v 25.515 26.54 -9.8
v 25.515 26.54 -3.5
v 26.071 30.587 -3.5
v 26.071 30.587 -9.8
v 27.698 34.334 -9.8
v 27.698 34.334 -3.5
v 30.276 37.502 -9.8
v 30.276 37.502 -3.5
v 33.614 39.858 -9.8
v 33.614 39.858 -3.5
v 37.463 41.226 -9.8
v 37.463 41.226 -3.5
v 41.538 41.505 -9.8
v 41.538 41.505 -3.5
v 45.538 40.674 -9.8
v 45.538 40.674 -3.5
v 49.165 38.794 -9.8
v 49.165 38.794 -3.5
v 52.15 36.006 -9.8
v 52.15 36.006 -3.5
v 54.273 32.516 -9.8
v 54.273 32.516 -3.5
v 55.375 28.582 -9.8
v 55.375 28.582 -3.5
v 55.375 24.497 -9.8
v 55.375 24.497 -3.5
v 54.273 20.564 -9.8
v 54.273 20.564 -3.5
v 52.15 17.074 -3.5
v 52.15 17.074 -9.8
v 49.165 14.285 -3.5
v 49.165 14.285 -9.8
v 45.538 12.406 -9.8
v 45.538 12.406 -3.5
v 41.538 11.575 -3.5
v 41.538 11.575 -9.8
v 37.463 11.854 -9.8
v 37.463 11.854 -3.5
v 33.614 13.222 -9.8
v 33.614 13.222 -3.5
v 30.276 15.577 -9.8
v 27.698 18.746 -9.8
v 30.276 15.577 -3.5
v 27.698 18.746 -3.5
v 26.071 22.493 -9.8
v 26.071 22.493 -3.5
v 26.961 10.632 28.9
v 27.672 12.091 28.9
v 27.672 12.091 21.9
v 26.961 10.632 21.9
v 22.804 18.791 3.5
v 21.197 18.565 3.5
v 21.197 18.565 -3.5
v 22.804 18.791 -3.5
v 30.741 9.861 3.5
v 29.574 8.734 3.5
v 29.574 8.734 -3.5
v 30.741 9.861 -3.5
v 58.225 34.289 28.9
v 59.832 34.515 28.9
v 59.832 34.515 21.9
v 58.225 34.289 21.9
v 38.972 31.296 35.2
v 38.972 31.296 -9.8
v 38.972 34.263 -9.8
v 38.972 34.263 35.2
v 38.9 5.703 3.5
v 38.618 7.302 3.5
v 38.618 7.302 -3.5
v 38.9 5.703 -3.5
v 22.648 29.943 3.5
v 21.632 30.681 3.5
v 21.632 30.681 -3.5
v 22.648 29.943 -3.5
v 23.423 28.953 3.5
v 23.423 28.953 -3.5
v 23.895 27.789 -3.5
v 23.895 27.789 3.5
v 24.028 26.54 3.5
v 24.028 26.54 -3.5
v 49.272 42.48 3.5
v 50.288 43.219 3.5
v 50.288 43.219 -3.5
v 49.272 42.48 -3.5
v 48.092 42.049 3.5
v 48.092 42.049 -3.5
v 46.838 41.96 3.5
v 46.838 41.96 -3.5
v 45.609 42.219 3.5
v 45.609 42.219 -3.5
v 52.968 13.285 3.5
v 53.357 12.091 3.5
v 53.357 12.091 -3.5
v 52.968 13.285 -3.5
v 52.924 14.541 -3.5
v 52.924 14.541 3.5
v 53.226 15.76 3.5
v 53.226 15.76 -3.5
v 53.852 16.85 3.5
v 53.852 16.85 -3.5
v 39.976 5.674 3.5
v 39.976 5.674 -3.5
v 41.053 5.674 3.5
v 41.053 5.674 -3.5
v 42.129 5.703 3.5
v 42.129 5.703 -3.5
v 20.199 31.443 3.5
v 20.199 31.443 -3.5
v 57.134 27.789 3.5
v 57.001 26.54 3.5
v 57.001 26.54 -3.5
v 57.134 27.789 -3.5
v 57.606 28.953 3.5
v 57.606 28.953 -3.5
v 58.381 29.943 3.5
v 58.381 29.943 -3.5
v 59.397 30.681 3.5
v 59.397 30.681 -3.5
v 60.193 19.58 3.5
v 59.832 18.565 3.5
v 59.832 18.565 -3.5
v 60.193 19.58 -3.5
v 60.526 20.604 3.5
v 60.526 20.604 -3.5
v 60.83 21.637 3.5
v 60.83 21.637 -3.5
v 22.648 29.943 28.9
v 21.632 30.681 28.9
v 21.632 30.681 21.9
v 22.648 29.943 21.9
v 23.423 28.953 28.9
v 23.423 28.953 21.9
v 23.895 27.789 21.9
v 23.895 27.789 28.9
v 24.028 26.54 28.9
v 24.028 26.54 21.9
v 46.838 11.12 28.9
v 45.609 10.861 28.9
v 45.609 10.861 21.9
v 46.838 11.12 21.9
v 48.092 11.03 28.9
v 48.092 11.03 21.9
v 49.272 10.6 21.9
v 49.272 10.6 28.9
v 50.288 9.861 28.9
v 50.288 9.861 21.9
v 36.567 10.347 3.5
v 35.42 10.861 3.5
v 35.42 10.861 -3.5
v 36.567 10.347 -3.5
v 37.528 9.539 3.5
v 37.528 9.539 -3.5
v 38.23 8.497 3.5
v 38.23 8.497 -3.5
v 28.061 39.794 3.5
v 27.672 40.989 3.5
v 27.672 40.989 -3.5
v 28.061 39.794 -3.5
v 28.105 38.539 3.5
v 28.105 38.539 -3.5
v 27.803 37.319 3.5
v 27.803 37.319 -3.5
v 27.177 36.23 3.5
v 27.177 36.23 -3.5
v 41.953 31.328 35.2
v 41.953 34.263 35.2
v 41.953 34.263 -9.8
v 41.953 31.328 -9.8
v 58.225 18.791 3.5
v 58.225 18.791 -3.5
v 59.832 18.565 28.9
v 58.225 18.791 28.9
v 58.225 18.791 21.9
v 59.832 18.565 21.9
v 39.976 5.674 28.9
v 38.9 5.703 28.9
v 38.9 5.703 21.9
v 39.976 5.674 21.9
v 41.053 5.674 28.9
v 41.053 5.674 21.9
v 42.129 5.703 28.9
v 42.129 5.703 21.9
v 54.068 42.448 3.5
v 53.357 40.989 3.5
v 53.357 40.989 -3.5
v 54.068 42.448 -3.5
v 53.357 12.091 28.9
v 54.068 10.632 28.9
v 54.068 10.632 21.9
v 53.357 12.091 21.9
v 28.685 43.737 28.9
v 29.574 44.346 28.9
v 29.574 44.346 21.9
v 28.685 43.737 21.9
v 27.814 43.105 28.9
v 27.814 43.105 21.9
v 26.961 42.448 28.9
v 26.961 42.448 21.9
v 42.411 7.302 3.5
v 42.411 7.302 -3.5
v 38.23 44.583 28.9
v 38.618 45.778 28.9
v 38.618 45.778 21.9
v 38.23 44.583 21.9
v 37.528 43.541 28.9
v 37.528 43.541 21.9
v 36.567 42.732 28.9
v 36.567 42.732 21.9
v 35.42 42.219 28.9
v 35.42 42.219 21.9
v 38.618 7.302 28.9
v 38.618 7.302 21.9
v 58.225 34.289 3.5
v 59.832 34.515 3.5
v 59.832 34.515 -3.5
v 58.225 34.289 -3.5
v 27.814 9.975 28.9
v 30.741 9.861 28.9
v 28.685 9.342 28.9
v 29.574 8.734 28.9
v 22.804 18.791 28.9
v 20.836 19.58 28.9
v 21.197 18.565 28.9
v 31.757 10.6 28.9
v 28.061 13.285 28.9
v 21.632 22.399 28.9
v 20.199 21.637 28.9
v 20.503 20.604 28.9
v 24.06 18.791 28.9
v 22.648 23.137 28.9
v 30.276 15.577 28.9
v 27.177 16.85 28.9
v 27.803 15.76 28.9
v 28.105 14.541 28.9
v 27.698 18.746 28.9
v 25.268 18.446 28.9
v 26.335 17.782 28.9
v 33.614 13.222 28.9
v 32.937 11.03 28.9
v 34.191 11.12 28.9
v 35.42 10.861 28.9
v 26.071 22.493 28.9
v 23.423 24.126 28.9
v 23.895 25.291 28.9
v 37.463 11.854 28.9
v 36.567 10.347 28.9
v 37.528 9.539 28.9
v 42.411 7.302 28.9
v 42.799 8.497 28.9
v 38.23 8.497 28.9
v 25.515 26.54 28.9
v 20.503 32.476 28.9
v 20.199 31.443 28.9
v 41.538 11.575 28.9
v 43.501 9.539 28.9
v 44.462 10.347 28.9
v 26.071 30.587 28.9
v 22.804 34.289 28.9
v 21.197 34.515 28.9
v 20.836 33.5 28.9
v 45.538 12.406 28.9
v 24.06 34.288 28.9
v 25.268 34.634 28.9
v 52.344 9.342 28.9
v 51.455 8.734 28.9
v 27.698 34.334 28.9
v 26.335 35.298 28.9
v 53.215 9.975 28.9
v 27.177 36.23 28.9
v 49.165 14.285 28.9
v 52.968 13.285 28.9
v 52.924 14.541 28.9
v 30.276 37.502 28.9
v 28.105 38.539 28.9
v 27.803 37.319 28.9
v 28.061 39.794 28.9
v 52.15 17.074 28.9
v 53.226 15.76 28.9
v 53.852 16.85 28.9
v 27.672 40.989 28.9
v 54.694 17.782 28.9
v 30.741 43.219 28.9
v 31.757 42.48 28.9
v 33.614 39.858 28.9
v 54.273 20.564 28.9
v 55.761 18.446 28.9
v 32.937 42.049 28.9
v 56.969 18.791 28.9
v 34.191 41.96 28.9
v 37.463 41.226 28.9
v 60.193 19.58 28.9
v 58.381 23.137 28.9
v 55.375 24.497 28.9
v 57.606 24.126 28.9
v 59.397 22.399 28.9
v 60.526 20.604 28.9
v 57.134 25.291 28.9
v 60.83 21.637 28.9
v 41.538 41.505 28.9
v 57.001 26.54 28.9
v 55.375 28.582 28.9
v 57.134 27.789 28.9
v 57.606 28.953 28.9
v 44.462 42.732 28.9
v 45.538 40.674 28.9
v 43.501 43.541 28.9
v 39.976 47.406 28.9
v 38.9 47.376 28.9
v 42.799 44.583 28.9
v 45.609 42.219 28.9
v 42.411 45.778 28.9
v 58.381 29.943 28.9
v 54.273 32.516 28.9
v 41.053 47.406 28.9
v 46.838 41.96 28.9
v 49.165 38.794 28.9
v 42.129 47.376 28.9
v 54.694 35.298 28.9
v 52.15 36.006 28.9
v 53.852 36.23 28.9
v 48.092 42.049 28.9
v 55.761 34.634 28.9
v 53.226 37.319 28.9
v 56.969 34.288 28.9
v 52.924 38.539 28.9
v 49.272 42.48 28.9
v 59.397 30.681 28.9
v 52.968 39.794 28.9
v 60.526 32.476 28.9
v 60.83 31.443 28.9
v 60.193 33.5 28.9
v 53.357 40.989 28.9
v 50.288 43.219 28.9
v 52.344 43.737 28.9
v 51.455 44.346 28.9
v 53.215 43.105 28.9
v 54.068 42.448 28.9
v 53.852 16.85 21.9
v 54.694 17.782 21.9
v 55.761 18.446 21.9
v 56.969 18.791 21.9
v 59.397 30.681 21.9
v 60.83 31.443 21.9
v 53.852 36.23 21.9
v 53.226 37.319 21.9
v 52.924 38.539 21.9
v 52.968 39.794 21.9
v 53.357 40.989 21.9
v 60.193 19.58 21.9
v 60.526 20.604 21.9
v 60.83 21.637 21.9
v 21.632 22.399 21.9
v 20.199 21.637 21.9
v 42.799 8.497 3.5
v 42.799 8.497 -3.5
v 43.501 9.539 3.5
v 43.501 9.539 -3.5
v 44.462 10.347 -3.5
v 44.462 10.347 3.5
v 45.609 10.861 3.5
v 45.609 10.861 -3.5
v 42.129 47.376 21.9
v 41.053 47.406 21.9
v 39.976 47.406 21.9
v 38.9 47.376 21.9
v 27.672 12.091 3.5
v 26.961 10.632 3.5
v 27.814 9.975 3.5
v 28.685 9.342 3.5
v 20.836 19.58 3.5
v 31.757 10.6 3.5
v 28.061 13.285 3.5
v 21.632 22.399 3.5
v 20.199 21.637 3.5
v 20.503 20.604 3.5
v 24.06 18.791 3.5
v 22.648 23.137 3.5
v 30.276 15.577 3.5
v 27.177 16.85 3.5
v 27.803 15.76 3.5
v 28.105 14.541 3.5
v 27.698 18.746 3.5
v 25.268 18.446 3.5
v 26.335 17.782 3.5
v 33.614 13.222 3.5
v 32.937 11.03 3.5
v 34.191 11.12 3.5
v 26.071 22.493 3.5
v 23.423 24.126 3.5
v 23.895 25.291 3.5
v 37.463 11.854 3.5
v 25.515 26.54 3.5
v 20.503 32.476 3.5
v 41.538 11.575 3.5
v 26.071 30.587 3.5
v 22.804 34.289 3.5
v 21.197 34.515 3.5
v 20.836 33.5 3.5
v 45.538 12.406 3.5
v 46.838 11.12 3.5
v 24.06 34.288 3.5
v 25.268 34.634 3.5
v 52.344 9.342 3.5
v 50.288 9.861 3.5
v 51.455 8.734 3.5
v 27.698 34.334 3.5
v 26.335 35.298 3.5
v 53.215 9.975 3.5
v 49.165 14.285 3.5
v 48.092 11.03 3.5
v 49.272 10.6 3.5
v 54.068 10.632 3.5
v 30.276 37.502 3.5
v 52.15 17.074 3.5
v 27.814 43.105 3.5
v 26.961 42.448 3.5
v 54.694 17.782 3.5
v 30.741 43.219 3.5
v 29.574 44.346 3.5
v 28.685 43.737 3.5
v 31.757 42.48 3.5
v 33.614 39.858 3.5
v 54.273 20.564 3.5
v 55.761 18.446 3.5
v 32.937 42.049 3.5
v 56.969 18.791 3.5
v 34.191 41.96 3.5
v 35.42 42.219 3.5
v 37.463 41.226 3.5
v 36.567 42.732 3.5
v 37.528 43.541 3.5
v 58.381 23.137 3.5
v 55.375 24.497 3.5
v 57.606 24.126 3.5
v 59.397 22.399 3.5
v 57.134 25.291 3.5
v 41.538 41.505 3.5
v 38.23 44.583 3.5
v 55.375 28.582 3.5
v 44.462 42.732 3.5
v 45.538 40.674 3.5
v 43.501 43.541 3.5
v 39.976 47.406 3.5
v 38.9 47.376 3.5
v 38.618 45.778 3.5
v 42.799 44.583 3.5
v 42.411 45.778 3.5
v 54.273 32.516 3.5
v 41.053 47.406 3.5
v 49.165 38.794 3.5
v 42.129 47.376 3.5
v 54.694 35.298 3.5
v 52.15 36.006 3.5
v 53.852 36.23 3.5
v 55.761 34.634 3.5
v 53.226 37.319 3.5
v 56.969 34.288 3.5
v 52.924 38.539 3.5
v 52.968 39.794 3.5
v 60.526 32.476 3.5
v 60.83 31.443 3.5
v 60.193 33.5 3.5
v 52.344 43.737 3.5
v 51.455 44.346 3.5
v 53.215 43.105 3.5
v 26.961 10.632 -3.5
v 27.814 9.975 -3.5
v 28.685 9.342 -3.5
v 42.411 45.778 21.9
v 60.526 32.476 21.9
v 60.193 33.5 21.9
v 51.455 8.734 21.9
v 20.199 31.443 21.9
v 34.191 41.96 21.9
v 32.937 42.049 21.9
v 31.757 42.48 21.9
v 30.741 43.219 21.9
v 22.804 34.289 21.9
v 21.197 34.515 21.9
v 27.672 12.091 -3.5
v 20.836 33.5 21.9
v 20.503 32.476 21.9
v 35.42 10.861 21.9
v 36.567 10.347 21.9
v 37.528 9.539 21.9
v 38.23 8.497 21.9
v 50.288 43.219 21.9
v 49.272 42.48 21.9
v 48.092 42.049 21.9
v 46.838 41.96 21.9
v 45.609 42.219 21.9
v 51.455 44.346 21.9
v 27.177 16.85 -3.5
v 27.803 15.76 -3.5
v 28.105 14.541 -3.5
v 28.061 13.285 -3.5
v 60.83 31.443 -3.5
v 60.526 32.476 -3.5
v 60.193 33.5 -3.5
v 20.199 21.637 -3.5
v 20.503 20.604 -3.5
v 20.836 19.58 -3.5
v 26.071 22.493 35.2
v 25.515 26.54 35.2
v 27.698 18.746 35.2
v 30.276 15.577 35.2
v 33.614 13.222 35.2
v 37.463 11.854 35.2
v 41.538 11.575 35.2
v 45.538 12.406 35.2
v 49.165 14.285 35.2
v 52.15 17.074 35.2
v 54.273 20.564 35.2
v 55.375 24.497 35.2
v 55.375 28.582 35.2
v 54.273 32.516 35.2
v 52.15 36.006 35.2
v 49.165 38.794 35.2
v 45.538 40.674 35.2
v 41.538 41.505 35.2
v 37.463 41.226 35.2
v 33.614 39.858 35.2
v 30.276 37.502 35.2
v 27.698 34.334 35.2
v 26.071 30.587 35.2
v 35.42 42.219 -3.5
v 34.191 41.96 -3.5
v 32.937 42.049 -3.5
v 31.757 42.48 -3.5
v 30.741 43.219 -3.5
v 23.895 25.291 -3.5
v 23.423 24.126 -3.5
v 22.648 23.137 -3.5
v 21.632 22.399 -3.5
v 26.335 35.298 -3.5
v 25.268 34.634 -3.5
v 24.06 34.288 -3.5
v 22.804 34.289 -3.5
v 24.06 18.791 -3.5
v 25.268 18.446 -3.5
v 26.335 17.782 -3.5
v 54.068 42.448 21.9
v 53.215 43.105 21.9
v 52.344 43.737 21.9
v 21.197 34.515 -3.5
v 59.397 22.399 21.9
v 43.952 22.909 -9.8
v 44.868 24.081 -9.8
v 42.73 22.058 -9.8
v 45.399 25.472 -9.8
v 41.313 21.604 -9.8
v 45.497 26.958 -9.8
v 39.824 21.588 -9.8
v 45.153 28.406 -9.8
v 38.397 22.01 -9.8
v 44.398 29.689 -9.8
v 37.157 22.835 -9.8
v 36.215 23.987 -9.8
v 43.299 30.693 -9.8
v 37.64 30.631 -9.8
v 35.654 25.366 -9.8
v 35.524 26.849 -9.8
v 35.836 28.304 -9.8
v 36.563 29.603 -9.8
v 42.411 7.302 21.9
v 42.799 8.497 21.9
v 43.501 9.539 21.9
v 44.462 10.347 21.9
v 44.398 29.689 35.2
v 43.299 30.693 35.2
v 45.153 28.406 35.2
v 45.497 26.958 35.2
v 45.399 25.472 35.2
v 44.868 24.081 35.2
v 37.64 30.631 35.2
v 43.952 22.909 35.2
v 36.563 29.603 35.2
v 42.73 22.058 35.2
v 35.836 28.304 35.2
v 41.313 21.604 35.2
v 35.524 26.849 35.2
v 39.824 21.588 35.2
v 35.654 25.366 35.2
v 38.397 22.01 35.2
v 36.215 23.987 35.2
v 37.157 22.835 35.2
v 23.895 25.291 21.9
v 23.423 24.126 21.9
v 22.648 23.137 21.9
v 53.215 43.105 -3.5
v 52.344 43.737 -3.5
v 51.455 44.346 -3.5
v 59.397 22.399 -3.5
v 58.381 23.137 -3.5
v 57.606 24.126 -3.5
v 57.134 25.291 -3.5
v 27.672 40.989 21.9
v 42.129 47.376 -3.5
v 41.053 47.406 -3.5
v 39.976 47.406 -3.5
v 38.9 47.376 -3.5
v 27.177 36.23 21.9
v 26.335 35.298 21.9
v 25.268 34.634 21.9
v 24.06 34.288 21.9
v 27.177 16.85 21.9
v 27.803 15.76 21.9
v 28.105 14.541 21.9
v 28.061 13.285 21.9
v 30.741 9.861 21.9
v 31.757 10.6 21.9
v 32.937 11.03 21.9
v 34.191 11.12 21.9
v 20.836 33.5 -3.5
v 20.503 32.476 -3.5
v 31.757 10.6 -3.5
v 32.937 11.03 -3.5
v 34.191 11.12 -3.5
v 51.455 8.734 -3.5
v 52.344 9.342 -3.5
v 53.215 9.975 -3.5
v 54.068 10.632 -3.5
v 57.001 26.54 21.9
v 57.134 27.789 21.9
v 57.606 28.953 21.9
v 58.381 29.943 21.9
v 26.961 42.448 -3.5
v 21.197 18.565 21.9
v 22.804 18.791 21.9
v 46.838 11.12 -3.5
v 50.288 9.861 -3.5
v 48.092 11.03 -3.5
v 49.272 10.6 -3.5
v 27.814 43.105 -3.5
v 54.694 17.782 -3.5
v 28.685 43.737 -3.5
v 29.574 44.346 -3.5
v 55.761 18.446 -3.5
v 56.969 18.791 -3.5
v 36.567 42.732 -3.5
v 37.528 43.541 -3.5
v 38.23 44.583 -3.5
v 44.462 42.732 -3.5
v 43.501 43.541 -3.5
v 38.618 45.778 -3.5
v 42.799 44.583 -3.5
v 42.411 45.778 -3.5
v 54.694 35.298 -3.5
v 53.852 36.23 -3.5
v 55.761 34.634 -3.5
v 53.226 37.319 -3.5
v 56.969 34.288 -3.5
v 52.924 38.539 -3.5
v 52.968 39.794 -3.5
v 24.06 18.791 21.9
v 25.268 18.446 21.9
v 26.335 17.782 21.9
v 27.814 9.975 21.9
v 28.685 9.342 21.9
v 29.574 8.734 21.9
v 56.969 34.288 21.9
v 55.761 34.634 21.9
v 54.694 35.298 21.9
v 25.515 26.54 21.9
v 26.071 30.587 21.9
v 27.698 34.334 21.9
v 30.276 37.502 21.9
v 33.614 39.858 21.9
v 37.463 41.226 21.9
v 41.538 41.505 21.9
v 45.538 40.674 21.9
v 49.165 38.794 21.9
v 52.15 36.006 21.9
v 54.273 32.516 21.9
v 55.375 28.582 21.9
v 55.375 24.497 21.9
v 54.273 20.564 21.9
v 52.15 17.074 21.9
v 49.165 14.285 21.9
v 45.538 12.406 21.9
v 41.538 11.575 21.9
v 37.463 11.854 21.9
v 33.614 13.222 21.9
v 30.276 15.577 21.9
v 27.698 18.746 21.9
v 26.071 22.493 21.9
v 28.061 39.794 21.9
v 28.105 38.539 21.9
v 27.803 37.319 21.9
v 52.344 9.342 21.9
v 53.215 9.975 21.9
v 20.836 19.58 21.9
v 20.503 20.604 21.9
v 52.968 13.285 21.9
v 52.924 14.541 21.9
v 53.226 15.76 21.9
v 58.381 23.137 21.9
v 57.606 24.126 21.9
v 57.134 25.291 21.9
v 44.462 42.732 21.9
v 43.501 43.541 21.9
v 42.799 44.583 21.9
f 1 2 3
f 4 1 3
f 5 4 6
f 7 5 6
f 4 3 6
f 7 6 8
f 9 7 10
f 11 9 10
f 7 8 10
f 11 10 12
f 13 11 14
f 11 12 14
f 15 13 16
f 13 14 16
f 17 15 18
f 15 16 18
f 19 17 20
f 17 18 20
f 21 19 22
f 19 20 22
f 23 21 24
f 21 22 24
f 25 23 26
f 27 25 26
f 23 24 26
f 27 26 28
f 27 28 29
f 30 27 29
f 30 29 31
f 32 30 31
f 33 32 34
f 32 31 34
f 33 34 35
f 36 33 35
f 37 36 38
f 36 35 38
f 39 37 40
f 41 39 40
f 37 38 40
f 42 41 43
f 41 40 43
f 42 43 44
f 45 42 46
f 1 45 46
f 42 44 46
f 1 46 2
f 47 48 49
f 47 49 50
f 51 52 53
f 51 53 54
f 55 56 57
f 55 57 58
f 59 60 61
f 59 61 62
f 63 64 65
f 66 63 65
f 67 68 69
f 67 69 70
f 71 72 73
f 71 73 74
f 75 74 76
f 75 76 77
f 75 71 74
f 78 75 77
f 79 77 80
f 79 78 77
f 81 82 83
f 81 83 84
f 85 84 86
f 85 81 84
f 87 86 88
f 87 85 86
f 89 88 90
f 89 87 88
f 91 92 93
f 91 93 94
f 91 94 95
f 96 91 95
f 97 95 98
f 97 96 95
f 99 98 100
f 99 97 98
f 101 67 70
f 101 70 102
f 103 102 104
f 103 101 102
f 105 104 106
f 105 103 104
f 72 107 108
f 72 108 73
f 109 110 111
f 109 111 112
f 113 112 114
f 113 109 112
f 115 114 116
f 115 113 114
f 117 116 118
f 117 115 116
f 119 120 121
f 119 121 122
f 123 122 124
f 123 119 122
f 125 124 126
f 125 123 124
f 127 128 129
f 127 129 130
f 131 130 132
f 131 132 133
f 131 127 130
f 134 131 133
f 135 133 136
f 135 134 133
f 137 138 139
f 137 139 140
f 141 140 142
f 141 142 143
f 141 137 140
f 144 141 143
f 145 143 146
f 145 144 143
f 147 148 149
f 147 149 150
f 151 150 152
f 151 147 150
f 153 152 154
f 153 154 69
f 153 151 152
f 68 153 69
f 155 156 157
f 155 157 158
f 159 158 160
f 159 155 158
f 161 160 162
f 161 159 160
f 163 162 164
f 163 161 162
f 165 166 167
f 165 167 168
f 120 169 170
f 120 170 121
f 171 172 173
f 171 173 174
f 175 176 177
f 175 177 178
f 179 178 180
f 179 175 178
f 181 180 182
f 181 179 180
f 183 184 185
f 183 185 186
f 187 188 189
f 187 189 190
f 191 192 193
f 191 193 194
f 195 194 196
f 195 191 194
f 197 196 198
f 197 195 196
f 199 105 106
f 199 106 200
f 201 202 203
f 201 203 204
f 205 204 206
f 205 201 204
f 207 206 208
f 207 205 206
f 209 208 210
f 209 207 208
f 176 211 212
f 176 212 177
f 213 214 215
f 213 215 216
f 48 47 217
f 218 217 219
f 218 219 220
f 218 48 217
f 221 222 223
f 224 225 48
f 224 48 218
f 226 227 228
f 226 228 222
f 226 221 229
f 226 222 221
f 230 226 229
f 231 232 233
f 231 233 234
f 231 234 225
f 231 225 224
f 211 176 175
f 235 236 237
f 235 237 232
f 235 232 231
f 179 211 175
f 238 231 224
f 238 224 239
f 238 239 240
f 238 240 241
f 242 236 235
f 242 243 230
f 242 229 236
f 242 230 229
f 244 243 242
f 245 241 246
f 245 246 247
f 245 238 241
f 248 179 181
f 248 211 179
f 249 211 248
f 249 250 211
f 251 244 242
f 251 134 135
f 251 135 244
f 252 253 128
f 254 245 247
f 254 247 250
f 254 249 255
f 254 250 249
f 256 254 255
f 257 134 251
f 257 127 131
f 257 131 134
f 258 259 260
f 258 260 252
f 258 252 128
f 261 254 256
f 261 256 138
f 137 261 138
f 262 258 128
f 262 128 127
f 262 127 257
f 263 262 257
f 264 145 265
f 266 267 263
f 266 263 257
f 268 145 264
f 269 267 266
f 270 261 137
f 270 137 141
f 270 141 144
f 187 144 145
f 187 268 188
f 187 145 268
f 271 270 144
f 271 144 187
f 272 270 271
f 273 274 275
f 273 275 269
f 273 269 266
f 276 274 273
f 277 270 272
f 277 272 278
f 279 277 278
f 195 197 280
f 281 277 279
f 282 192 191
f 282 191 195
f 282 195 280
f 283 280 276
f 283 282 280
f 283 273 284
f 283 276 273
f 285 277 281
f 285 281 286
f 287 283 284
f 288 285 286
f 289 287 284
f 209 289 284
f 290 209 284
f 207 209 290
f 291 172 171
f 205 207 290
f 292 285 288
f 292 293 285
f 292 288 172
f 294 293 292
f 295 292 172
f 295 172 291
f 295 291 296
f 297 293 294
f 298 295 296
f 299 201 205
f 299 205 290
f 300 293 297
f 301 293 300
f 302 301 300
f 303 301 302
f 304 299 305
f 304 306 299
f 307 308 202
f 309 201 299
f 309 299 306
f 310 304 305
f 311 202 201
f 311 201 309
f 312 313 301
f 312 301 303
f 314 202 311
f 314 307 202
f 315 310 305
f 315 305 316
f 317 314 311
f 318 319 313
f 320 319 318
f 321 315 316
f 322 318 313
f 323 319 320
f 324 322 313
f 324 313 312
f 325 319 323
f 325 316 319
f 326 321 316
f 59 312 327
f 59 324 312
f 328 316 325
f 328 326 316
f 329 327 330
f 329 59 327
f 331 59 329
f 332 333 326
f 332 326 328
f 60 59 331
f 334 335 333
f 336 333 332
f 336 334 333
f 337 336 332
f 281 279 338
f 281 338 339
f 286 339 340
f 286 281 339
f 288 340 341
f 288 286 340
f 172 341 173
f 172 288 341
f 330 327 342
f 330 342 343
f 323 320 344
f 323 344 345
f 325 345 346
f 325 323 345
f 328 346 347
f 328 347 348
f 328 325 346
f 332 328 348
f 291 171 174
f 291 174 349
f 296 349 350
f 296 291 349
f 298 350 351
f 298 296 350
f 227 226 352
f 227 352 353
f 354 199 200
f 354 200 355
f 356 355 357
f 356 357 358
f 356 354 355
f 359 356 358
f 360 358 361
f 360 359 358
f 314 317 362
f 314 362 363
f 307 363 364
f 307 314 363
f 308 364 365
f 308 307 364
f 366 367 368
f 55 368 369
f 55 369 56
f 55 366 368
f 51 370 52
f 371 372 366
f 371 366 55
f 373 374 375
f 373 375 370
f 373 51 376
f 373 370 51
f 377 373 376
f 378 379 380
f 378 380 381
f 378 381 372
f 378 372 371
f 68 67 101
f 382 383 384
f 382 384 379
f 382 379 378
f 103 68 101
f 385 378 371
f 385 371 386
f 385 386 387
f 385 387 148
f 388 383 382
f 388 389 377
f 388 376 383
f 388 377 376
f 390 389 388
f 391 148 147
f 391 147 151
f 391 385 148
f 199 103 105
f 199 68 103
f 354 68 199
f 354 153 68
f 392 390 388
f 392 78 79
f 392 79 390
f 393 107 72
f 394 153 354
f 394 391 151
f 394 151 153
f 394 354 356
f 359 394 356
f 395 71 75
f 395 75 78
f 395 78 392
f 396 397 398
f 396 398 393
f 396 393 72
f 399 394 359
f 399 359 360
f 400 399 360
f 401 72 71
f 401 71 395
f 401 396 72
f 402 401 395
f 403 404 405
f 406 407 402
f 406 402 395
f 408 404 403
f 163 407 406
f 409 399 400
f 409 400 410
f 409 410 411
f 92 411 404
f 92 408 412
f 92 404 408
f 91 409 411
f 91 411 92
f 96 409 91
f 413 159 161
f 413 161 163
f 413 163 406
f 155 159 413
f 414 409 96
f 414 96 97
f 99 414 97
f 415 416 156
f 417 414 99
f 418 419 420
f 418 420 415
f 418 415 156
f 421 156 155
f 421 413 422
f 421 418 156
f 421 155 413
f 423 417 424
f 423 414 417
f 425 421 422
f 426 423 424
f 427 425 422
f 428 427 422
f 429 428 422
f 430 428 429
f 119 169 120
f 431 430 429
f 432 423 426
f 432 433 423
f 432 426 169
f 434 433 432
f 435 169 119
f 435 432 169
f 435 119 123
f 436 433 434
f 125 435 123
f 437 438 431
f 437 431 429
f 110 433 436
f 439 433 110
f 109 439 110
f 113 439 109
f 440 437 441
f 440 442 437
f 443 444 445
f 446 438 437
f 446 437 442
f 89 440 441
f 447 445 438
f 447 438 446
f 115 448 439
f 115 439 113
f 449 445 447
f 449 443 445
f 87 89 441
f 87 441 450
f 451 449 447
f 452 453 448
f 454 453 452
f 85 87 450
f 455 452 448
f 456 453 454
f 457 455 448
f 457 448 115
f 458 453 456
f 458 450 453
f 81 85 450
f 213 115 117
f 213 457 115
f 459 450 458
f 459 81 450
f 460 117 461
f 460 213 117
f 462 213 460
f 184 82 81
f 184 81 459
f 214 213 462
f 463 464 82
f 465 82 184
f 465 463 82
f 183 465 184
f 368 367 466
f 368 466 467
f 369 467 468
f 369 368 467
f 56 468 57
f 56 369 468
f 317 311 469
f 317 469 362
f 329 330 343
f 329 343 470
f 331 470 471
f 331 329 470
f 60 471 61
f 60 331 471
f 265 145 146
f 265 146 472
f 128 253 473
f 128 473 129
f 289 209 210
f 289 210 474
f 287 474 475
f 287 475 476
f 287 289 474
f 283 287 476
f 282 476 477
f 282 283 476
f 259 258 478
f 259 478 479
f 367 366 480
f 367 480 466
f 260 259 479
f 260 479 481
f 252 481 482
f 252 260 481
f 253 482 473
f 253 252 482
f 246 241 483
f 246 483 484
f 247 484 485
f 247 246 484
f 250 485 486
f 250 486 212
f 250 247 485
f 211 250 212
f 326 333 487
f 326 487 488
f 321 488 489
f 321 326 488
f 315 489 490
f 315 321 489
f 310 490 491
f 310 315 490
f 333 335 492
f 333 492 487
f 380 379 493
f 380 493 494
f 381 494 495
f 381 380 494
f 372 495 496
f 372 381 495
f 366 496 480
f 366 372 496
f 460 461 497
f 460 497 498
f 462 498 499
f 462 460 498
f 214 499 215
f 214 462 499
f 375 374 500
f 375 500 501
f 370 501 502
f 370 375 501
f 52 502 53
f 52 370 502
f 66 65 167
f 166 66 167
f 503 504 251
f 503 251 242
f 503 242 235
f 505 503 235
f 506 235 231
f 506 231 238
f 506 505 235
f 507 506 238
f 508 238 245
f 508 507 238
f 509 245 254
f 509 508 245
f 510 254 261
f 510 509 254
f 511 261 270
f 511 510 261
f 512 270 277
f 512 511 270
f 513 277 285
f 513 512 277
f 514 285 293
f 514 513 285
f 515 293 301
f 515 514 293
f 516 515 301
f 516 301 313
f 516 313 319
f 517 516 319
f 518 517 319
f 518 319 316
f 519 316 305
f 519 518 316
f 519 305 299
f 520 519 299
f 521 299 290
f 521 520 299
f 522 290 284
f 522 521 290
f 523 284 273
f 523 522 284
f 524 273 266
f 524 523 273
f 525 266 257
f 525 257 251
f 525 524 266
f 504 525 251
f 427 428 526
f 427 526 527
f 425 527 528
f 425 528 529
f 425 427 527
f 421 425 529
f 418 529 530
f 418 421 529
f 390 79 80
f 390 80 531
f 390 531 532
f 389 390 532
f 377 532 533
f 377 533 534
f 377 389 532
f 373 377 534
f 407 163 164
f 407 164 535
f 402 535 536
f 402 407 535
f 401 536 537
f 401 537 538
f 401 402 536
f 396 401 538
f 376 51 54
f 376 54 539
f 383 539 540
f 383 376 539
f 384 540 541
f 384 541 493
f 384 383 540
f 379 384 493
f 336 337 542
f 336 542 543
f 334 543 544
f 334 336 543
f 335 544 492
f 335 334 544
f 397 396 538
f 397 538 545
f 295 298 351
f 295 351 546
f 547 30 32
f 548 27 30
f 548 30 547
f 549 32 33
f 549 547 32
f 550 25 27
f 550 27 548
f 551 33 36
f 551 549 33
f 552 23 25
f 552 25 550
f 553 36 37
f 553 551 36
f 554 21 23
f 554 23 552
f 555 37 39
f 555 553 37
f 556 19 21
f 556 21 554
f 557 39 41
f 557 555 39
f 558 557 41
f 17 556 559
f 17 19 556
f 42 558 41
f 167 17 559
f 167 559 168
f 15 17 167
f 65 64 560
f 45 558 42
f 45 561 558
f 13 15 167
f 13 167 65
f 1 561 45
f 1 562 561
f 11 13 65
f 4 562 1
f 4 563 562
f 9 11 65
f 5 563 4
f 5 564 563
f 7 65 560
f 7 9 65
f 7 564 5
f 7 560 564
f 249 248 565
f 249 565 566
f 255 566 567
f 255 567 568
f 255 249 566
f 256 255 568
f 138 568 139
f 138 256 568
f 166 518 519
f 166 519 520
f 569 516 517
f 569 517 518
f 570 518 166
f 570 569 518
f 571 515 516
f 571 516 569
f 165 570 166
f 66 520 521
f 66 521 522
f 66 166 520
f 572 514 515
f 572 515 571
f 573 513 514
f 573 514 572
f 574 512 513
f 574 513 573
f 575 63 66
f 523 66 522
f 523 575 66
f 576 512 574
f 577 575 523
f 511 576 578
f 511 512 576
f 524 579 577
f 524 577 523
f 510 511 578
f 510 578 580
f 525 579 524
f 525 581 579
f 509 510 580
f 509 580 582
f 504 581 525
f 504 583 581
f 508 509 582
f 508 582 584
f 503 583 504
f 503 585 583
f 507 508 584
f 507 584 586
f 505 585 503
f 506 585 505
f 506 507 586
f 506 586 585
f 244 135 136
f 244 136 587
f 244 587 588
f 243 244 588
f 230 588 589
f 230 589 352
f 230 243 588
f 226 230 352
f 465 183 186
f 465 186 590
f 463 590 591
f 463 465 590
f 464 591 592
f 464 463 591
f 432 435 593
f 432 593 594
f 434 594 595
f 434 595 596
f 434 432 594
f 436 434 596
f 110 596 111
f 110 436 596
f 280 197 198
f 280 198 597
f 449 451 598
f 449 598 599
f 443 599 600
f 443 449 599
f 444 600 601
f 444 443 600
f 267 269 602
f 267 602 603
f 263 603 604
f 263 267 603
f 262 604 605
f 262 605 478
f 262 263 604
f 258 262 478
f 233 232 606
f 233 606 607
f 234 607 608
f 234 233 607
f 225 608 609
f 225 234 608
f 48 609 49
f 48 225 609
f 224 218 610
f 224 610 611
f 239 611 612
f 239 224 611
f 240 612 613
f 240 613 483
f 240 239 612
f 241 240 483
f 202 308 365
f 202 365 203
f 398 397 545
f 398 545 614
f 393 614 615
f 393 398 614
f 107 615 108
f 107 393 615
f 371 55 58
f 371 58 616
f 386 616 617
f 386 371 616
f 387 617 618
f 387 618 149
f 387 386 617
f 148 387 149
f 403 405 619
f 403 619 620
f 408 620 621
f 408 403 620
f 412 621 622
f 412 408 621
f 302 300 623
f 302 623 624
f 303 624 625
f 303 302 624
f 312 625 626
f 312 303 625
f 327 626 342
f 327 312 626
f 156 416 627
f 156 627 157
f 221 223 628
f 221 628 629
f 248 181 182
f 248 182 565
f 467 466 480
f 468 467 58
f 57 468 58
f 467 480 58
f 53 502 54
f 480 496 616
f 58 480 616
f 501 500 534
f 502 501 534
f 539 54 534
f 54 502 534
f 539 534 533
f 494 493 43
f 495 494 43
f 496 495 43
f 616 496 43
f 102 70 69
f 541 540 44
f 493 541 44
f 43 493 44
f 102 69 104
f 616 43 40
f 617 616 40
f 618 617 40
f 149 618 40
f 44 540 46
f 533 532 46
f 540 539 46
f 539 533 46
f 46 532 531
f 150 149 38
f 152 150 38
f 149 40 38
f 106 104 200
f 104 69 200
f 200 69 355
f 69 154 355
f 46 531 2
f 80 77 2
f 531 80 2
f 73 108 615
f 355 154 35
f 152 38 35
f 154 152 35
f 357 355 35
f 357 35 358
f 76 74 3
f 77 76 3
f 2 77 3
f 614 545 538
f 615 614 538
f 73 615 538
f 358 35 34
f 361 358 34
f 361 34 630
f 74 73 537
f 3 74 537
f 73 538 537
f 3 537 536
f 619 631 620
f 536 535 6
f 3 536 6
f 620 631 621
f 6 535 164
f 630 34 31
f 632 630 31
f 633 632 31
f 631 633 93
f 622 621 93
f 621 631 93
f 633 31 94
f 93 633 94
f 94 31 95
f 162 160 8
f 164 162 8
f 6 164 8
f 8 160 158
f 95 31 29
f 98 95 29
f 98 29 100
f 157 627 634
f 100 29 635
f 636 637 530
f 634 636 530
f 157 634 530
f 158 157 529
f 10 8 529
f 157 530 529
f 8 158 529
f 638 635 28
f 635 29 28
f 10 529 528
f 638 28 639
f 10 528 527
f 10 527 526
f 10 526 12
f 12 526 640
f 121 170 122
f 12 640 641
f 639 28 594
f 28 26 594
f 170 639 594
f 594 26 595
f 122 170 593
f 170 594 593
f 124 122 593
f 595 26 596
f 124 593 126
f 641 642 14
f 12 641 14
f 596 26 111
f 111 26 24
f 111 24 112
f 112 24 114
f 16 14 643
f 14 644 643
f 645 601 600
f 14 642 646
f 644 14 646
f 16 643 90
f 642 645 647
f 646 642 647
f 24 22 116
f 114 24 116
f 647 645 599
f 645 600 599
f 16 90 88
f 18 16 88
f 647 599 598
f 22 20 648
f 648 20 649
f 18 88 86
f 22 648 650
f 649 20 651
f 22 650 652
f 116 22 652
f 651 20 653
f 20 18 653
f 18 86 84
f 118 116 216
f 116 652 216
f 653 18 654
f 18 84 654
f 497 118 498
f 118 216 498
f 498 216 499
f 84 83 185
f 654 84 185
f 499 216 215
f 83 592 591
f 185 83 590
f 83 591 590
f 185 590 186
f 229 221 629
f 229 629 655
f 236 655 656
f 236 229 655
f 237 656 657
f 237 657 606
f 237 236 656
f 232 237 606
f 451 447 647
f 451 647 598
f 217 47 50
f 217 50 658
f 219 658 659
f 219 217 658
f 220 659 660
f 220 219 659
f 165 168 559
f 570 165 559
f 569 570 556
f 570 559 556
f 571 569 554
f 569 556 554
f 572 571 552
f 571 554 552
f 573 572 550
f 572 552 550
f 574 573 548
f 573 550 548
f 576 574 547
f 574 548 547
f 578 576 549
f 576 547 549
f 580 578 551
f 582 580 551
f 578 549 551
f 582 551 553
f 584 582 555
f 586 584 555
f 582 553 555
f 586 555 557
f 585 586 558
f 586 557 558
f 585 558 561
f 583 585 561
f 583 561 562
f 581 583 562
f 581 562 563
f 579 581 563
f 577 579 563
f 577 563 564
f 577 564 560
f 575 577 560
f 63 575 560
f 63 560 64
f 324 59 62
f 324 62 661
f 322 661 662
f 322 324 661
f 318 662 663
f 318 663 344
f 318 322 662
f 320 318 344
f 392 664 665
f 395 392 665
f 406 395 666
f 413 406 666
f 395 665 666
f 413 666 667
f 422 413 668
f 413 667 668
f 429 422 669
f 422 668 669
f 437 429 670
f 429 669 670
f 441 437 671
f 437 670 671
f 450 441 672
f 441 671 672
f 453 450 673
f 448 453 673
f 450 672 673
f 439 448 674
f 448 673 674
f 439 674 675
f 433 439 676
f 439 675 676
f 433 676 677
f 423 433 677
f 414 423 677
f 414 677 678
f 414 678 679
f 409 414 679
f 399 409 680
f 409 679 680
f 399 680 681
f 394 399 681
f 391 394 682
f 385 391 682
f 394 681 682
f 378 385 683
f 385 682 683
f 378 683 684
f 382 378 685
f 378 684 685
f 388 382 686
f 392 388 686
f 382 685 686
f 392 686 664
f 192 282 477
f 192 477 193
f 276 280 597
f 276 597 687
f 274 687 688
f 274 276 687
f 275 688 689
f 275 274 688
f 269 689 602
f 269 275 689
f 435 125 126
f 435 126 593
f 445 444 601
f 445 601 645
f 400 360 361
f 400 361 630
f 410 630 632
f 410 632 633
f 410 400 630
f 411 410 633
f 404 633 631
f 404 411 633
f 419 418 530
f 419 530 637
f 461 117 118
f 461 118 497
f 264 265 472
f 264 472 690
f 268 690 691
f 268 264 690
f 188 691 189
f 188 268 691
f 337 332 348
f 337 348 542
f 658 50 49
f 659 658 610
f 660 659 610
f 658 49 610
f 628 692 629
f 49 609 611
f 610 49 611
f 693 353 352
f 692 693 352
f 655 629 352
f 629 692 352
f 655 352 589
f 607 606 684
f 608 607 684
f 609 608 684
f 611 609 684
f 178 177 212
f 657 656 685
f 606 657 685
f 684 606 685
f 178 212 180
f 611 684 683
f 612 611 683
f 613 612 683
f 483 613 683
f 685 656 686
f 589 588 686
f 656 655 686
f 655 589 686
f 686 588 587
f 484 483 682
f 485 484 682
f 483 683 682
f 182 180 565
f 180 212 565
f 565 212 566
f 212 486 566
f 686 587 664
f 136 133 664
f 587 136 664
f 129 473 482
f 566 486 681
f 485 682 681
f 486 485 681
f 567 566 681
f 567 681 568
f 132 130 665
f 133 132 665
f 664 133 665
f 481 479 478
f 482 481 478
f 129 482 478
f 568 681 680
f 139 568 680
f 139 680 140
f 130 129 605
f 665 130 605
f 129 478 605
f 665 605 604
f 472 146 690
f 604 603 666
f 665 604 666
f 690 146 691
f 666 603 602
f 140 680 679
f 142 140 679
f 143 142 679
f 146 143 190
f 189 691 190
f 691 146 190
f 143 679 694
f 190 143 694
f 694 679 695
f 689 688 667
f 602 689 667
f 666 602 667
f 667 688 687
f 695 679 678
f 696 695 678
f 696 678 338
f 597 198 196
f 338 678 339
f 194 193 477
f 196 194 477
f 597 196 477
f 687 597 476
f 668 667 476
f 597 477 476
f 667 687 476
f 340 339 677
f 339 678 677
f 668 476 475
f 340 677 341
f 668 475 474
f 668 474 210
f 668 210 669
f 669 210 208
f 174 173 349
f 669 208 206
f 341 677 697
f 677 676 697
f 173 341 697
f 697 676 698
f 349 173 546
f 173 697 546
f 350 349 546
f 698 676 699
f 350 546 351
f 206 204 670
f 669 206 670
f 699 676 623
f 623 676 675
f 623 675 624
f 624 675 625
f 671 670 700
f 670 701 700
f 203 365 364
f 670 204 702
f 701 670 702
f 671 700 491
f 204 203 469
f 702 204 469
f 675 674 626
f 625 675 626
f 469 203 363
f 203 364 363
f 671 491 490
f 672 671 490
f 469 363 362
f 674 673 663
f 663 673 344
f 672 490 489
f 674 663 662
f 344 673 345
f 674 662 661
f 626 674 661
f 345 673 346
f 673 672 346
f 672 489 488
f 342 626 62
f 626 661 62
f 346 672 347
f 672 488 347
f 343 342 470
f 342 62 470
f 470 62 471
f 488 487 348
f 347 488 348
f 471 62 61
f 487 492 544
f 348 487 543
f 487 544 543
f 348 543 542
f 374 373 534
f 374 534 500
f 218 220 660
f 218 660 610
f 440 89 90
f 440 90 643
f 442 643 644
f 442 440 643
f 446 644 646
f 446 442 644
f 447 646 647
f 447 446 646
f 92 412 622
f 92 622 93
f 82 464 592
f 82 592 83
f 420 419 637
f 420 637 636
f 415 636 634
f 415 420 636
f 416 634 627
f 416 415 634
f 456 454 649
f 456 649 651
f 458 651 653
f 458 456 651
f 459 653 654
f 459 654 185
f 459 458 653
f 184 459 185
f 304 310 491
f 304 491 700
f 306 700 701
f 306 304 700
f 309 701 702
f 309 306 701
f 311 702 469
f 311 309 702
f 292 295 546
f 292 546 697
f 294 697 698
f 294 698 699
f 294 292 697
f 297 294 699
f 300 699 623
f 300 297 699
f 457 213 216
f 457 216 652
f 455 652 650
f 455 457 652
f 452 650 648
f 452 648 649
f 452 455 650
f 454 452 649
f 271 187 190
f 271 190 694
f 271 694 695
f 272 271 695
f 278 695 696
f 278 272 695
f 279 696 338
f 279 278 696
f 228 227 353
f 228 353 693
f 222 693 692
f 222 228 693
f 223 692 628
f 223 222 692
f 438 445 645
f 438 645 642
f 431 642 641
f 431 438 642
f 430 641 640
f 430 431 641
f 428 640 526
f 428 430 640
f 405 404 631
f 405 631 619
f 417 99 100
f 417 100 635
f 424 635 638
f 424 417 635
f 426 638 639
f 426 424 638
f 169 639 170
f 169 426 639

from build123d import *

# Parameters (mm, degrees)
EXTRUDE_1_DEPTH     = 7
SKETCH_2_R          = 15
EXTRUDE_2_DEPTH     = 18.4
EXTRUDE_3_DEPTH     = 7
EXTRUDE_START       = 6.3
SKETCH_4_R          = 15
EXTRUDE_4_DEPTH     = 6.3
SKETCH_5_R          = 15
EXTRUDE_5_DEPTH     = 6.3
CUT_EXTRUDE_1_DEPTH = 90.291681756


with BuildPart() as part:
    # 草图1 → 凸台-拉伸1 (new body)
    with BuildSketch(Plane.XY.offset(28.9)):
        with BuildLine():
            Line((42.411201909, 45.77806603), (42.129389286, 47.376304833))
            ThreePointArc((42.129389286, 47.376304833), (40.514502568, 47.409839327), (38.89961585, 47.376304833))
            Line((38.89961585, 47.376304833), (38.617803227, 45.77806603))
            ThreePointArc((38.617803227, 45.77806603), (37.528159676, 43.541003491), (35.420005537, 42.219088972))
            ThreePointArc((35.420005537, 42.219088972), (32.937471152, 42.04939837), (30.741018632, 43.218743572))
            Line((30.741018632, 43.218743572), (29.573606233, 44.346100621))
            ThreePointArc((29.573606233, 44.346100621), (28.247424353, 43.424024), (26.960664635, 42.447687427))
            Line((26.960664635, 42.447687427), (27.672094632, 40.98903977))
            ThreePointArc((27.672094632, 40.98903977), (28.10546685, 38.538741749), (27.176936184, 36.230148526))
            ThreePointArc((27.176936184, 36.230148526), (25.268265311, 34.633668845), (22.80397403, 34.288646587))
            Line((22.80397403, 34.288646587), (21.196873713, 34.514509808))
            ThreePointArc((21.196873713, 34.514509808), (20.665953073, 32.989024), (20.198818833, 31.442812735))
            Line((20.198818833, 31.442812735), (21.631749371, 30.680910052))
            ThreePointArc((21.631749371, 30.680910052), (23.422603901, 28.95330711), (24.028363863, 26.539839327))
            ThreePointArc((24.028363863, 26.539839327), (23.422603901, 24.126371544), (21.631749371, 22.398768602))
            Line((21.631749371, 22.398768602), (20.198818833, 21.63686592))
            ThreePointArc((20.198818833, 21.63686592), (20.665953073, 20.090654655), (21.196873713, 18.565168847))
            Line((21.196873713, 18.565168847), (22.80397403, 18.791032067))
            ThreePointArc((22.80397403, 18.791032067), (25.268265311, 18.446009809), (27.176936184, 16.849530129))
            ThreePointArc((27.176936184, 16.849530129), (28.10546685, 14.540936905), (27.672094632, 12.090638884))
            Line((27.672094632, 12.090638884), (26.960664635, 10.631991228))
            ThreePointArc((26.960664635, 10.631991228), (28.247424353, 9.655654655), (29.573606233, 8.733578033))
            Line((29.573606233, 8.733578033), (30.741018632, 9.860935083))
            ThreePointArc((30.741018632, 9.860935083), (32.937471152, 11.030280285), (35.420005536, 10.860589683))
            ThreePointArc((35.420005536, 10.860589683), (37.528159676, 9.538675164), (38.617803227, 7.301612625))
            Line((38.617803227, 7.301612625), (38.89961585, 5.703373822))
            ThreePointArc((38.89961585, 5.703373822), (40.514502568, 5.669839327), (42.129389286, 5.703373822))
            Line((42.129389286, 5.703373822), (42.411201909, 7.301612625))
            ThreePointArc((42.411201909, 7.301612625), (43.50084546, 9.538675164), (45.6089996, 10.860589683))
            ThreePointArc((45.6089996, 10.860589683), (48.091533984, 11.030280285), (50.287986504, 9.860935083))
            Line((50.287986504, 9.860935083), (51.455398903, 8.733578033))
            ThreePointArc((51.455398903, 8.733578033), (52.781580783, 9.655654655), (54.068340501, 10.631991228))
            Line((54.068340501, 10.631991228), (53.356910504, 12.090638884))
            ThreePointArc((53.356910504, 12.090638884), (52.923538286, 14.540936905), (53.852068952, 16.849530129))
            ThreePointArc((53.852068952, 16.849530129), (55.760739826, 18.446009809), (58.225031106, 18.791032067))
            Line((58.225031106, 18.791032067), (59.832131424, 18.565168847))
            ThreePointArc((59.832131424, 18.565168847), (60.363052063, 20.090654655), (60.830186304, 21.63686592))
            Line((60.830186304, 21.63686592), (59.397255765, 22.398768602))
            ThreePointArc((59.397255765, 22.398768602), (57.606401235, 24.126371544), (57.000641274, 26.539839327))
            ThreePointArc((57.000641274, 26.539839327), (57.606401235, 28.95330711), (59.397255765, 30.680910052))
            Line((59.397255765, 30.680910052), (60.830186304, 31.442812735))
            ThreePointArc((60.830186304, 31.442812735), (60.363052063, 32.989024), (59.832131424, 34.514509808))
            Line((59.832131424, 34.514509808), (58.225031106, 34.288646587))
            ThreePointArc((58.225031106, 34.288646587), (55.760739826, 34.633668845), (53.852068952, 36.230148526))
            ThreePointArc((53.852068952, 36.230148526), (52.923538286, 38.538741749), (53.356910504, 40.98903977))
            Line((53.356910504, 40.98903977), (54.068340501, 42.447687427))
            ThreePointArc((54.068340501, 42.447687427), (52.781580783, 43.424024), (51.455398903, 44.346100621))
            Line((51.455398903, 44.346100621), (50.287986504, 43.218743572))
            ThreePointArc((50.287986504, 43.218743572), (48.091533984, 42.04939837), (45.6089996, 42.219088972))
            ThreePointArc((45.6089996, 42.219088972), (43.50084546, 43.541003491), (42.411201909, 45.77806603))
        make_face()
    extrude(amount=-EXTRUDE_1_DEPTH)

    # 草图2 → 凸台-拉伸2 (add)
    with BuildSketch(Plane(origin=(0, 0, 21.9), x_dir=(-1, 0, 0), z_dir=(0, 0, -1))):
        with Locations((-40.514502568, 26.539839327)):
            Circle(SKETCH_2_R)
    extrude(amount=EXTRUDE_2_DEPTH)

    # 草图3 → 凸台-拉伸3 (add)
    with BuildSketch(Plane.XY.offset(3.5)):
        with BuildLine():
            Line((42.411201909, 45.77806603), (42.129389286, 47.376304833))
            ThreePointArc((42.129389286, 47.376304833), (40.514502568, 47.409839327), (38.89961585, 47.376304833))
            Line((38.89961585, 47.376304833), (38.617803227, 45.77806603))
            ThreePointArc((38.617803227, 45.77806603), (37.528159676, 43.541003491), (35.420005537, 42.219088972))
            ThreePointArc((35.420005537, 42.219088972), (32.937471152, 42.04939837), (30.741018632, 43.218743572))
            Line((30.741018632, 43.218743572), (29.573606233, 44.346100621))
            ThreePointArc((29.573606233, 44.346100621), (28.247424353, 43.424024), (26.960664635, 42.447687427))
            Line((26.960664635, 42.447687427), (27.672094632, 40.98903977))
            ThreePointArc((27.672094632, 40.98903977), (28.10546685, 38.538741749), (27.176936184, 36.230148526))
            ThreePointArc((27.176936184, 36.230148526), (25.268265311, 34.633668845), (22.80397403, 34.288646587))
            Line((22.80397403, 34.288646587), (21.196873713, 34.514509808))
            ThreePointArc((21.196873713, 34.514509808), (20.665953073, 32.989024), (20.198818833, 31.442812735))
            Line((20.198818833, 31.442812735), (21.631749371, 30.680910052))
            ThreePointArc((21.631749371, 30.680910052), (23.422603901, 28.95330711), (24.028363863, 26.539839327))
            ThreePointArc((24.028363863, 26.539839327), (23.422603901, 24.126371544), (21.631749371, 22.398768602))
            Line((21.631749371, 22.398768602), (20.198818833, 21.63686592))
            ThreePointArc((20.198818833, 21.63686592), (20.665953073, 20.090654655), (21.196873713, 18.565168847))
            Line((21.196873713, 18.565168847), (22.80397403, 18.791032067))
            ThreePointArc((22.80397403, 18.791032067), (25.268265311, 18.446009809), (27.176936184, 16.849530129))
            ThreePointArc((27.176936184, 16.849530129), (28.10546685, 14.540936905), (27.672094632, 12.090638884))
            Line((27.672094632, 12.090638884), (26.960664635, 10.631991228))
            ThreePointArc((26.960664635, 10.631991228), (28.247424353, 9.655654655), (29.573606233, 8.733578033))
            Line((29.573606233, 8.733578033), (30.741018632, 9.860935083))
            ThreePointArc((30.741018632, 9.860935083), (32.937471152, 11.030280285), (35.420005536, 10.860589683))
            ThreePointArc((35.420005536, 10.860589683), (37.528159676, 9.538675164), (38.617803227, 7.301612625))
            Line((38.617803227, 7.301612625), (38.89961585, 5.703373822))
            ThreePointArc((38.89961585, 5.703373822), (40.514502568, 5.669839327), (42.129389286, 5.703373822))
            Line((42.129389286, 5.703373822), (42.411201909, 7.301612625))
            ThreePointArc((42.411201909, 7.301612625), (43.50084546, 9.538675164), (45.6089996, 10.860589683))
            ThreePointArc((45.6089996, 10.860589683), (48.091533984, 11.030280285), (50.287986504, 9.860935083))
            Line((50.287986504, 9.860935083), (51.455398903, 8.733578033))
            ThreePointArc((51.455398903, 8.733578033), (52.781580783, 9.655654655), (54.068340501, 10.631991228))
            Line((54.068340501, 10.631991228), (53.356910504, 12.090638884))
            ThreePointArc((53.356910504, 12.090638884), (52.923538286, 14.540936905), (53.852068952, 16.849530129))
            ThreePointArc((53.852068952, 16.849530129), (55.760739826, 18.446009809), (58.225031106, 18.791032067))
            Line((58.225031106, 18.791032067), (59.832131424, 18.565168847))
            ThreePointArc((59.832131424, 18.565168847), (60.363052063, 20.090654655), (60.830186304, 21.63686592))
            Line((60.830186304, 21.63686592), (59.397255765, 22.398768602))
            ThreePointArc((59.397255765, 22.398768602), (57.606401235, 24.126371544), (57.000641274, 26.539839327))
            ThreePointArc((57.000641274, 26.539839327), (57.606401235, 28.95330711), (59.397255765, 30.680910052))
            Line((59.397255765, 30.680910052), (60.830186304, 31.442812735))
            ThreePointArc((60.830186304, 31.442812735), (60.363052063, 32.989024), (59.832131424, 34.514509808))
            Line((59.832131424, 34.514509808), (58.225031106, 34.288646587))
            ThreePointArc((58.225031106, 34.288646587), (55.760739826, 34.633668845), (53.852068952, 36.230148526))
            ThreePointArc((53.852068952, 36.230148526), (52.923538286, 38.538741749), (53.356910504, 40.98903977))
            Line((53.356910504, 40.98903977), (54.068340501, 42.447687427))
            ThreePointArc((54.068340501, 42.447687427), (52.781580783, 43.424024), (51.455398903, 44.346100621))
            Line((51.455398903, 44.346100621), (50.287986504, 43.218743572))
            ThreePointArc((50.287986504, 43.218743572), (48.091533984, 42.04939837), (45.6089996, 42.219088972))
            ThreePointArc((45.6089996, 42.219088972), (43.50084546, 43.541003491), (42.411201909, 45.77806603))
        make_face()
    extrude(amount=-EXTRUDE_3_DEPTH)

    # 草图4 → 凸台-拉伸4 (add)
    with BuildSketch(Plane.XY.offset(28.9).offset(EXTRUDE_START)):
        with Locations(Location((40.514502568, 26.539839327, 0), (0, 0, 180))):
            Circle(SKETCH_4_R)
    extrude(amount=-EXTRUDE_4_DEPTH)

    # 草图5 → 凸台-拉伸5 (add)
    with BuildSketch(Plane(origin=(0, 0, -3.5), x_dir=(-1, 0, 0), z_dir=(0, 0, -1))):
        with Locations((-40.514502568, 26.539839327)):
            Circle(SKETCH_5_R)
    extrude(amount=EXTRUDE_5_DEPTH)

    # 草图6 → 切除-拉伸1 (cut, through all)
    with BuildSketch(Plane(origin=(0, 0, -9.8), x_dir=(-1, 0, 0), z_dir=(0, 0, -1))):
        with BuildLine():
            Line((-38.971830845, 31.295905344), (-38.971830845, 34.262802089))
            Line((-38.971830845, 34.262802089), (-41.953176795, 34.262802089))
            Line((-41.953176795, 34.262802089), (-41.953176795, 31.328389888))
            ThreePointArc((-41.953176795, 31.328389888), (-40.568978996, 21.540136104), (-38.971830845, 31.295905344))
        make_face()
    extrude(amount=-CUT_EXTRUDE_1_DEPTH, mode=Mode.SUBTRACT)


solid = part.part
